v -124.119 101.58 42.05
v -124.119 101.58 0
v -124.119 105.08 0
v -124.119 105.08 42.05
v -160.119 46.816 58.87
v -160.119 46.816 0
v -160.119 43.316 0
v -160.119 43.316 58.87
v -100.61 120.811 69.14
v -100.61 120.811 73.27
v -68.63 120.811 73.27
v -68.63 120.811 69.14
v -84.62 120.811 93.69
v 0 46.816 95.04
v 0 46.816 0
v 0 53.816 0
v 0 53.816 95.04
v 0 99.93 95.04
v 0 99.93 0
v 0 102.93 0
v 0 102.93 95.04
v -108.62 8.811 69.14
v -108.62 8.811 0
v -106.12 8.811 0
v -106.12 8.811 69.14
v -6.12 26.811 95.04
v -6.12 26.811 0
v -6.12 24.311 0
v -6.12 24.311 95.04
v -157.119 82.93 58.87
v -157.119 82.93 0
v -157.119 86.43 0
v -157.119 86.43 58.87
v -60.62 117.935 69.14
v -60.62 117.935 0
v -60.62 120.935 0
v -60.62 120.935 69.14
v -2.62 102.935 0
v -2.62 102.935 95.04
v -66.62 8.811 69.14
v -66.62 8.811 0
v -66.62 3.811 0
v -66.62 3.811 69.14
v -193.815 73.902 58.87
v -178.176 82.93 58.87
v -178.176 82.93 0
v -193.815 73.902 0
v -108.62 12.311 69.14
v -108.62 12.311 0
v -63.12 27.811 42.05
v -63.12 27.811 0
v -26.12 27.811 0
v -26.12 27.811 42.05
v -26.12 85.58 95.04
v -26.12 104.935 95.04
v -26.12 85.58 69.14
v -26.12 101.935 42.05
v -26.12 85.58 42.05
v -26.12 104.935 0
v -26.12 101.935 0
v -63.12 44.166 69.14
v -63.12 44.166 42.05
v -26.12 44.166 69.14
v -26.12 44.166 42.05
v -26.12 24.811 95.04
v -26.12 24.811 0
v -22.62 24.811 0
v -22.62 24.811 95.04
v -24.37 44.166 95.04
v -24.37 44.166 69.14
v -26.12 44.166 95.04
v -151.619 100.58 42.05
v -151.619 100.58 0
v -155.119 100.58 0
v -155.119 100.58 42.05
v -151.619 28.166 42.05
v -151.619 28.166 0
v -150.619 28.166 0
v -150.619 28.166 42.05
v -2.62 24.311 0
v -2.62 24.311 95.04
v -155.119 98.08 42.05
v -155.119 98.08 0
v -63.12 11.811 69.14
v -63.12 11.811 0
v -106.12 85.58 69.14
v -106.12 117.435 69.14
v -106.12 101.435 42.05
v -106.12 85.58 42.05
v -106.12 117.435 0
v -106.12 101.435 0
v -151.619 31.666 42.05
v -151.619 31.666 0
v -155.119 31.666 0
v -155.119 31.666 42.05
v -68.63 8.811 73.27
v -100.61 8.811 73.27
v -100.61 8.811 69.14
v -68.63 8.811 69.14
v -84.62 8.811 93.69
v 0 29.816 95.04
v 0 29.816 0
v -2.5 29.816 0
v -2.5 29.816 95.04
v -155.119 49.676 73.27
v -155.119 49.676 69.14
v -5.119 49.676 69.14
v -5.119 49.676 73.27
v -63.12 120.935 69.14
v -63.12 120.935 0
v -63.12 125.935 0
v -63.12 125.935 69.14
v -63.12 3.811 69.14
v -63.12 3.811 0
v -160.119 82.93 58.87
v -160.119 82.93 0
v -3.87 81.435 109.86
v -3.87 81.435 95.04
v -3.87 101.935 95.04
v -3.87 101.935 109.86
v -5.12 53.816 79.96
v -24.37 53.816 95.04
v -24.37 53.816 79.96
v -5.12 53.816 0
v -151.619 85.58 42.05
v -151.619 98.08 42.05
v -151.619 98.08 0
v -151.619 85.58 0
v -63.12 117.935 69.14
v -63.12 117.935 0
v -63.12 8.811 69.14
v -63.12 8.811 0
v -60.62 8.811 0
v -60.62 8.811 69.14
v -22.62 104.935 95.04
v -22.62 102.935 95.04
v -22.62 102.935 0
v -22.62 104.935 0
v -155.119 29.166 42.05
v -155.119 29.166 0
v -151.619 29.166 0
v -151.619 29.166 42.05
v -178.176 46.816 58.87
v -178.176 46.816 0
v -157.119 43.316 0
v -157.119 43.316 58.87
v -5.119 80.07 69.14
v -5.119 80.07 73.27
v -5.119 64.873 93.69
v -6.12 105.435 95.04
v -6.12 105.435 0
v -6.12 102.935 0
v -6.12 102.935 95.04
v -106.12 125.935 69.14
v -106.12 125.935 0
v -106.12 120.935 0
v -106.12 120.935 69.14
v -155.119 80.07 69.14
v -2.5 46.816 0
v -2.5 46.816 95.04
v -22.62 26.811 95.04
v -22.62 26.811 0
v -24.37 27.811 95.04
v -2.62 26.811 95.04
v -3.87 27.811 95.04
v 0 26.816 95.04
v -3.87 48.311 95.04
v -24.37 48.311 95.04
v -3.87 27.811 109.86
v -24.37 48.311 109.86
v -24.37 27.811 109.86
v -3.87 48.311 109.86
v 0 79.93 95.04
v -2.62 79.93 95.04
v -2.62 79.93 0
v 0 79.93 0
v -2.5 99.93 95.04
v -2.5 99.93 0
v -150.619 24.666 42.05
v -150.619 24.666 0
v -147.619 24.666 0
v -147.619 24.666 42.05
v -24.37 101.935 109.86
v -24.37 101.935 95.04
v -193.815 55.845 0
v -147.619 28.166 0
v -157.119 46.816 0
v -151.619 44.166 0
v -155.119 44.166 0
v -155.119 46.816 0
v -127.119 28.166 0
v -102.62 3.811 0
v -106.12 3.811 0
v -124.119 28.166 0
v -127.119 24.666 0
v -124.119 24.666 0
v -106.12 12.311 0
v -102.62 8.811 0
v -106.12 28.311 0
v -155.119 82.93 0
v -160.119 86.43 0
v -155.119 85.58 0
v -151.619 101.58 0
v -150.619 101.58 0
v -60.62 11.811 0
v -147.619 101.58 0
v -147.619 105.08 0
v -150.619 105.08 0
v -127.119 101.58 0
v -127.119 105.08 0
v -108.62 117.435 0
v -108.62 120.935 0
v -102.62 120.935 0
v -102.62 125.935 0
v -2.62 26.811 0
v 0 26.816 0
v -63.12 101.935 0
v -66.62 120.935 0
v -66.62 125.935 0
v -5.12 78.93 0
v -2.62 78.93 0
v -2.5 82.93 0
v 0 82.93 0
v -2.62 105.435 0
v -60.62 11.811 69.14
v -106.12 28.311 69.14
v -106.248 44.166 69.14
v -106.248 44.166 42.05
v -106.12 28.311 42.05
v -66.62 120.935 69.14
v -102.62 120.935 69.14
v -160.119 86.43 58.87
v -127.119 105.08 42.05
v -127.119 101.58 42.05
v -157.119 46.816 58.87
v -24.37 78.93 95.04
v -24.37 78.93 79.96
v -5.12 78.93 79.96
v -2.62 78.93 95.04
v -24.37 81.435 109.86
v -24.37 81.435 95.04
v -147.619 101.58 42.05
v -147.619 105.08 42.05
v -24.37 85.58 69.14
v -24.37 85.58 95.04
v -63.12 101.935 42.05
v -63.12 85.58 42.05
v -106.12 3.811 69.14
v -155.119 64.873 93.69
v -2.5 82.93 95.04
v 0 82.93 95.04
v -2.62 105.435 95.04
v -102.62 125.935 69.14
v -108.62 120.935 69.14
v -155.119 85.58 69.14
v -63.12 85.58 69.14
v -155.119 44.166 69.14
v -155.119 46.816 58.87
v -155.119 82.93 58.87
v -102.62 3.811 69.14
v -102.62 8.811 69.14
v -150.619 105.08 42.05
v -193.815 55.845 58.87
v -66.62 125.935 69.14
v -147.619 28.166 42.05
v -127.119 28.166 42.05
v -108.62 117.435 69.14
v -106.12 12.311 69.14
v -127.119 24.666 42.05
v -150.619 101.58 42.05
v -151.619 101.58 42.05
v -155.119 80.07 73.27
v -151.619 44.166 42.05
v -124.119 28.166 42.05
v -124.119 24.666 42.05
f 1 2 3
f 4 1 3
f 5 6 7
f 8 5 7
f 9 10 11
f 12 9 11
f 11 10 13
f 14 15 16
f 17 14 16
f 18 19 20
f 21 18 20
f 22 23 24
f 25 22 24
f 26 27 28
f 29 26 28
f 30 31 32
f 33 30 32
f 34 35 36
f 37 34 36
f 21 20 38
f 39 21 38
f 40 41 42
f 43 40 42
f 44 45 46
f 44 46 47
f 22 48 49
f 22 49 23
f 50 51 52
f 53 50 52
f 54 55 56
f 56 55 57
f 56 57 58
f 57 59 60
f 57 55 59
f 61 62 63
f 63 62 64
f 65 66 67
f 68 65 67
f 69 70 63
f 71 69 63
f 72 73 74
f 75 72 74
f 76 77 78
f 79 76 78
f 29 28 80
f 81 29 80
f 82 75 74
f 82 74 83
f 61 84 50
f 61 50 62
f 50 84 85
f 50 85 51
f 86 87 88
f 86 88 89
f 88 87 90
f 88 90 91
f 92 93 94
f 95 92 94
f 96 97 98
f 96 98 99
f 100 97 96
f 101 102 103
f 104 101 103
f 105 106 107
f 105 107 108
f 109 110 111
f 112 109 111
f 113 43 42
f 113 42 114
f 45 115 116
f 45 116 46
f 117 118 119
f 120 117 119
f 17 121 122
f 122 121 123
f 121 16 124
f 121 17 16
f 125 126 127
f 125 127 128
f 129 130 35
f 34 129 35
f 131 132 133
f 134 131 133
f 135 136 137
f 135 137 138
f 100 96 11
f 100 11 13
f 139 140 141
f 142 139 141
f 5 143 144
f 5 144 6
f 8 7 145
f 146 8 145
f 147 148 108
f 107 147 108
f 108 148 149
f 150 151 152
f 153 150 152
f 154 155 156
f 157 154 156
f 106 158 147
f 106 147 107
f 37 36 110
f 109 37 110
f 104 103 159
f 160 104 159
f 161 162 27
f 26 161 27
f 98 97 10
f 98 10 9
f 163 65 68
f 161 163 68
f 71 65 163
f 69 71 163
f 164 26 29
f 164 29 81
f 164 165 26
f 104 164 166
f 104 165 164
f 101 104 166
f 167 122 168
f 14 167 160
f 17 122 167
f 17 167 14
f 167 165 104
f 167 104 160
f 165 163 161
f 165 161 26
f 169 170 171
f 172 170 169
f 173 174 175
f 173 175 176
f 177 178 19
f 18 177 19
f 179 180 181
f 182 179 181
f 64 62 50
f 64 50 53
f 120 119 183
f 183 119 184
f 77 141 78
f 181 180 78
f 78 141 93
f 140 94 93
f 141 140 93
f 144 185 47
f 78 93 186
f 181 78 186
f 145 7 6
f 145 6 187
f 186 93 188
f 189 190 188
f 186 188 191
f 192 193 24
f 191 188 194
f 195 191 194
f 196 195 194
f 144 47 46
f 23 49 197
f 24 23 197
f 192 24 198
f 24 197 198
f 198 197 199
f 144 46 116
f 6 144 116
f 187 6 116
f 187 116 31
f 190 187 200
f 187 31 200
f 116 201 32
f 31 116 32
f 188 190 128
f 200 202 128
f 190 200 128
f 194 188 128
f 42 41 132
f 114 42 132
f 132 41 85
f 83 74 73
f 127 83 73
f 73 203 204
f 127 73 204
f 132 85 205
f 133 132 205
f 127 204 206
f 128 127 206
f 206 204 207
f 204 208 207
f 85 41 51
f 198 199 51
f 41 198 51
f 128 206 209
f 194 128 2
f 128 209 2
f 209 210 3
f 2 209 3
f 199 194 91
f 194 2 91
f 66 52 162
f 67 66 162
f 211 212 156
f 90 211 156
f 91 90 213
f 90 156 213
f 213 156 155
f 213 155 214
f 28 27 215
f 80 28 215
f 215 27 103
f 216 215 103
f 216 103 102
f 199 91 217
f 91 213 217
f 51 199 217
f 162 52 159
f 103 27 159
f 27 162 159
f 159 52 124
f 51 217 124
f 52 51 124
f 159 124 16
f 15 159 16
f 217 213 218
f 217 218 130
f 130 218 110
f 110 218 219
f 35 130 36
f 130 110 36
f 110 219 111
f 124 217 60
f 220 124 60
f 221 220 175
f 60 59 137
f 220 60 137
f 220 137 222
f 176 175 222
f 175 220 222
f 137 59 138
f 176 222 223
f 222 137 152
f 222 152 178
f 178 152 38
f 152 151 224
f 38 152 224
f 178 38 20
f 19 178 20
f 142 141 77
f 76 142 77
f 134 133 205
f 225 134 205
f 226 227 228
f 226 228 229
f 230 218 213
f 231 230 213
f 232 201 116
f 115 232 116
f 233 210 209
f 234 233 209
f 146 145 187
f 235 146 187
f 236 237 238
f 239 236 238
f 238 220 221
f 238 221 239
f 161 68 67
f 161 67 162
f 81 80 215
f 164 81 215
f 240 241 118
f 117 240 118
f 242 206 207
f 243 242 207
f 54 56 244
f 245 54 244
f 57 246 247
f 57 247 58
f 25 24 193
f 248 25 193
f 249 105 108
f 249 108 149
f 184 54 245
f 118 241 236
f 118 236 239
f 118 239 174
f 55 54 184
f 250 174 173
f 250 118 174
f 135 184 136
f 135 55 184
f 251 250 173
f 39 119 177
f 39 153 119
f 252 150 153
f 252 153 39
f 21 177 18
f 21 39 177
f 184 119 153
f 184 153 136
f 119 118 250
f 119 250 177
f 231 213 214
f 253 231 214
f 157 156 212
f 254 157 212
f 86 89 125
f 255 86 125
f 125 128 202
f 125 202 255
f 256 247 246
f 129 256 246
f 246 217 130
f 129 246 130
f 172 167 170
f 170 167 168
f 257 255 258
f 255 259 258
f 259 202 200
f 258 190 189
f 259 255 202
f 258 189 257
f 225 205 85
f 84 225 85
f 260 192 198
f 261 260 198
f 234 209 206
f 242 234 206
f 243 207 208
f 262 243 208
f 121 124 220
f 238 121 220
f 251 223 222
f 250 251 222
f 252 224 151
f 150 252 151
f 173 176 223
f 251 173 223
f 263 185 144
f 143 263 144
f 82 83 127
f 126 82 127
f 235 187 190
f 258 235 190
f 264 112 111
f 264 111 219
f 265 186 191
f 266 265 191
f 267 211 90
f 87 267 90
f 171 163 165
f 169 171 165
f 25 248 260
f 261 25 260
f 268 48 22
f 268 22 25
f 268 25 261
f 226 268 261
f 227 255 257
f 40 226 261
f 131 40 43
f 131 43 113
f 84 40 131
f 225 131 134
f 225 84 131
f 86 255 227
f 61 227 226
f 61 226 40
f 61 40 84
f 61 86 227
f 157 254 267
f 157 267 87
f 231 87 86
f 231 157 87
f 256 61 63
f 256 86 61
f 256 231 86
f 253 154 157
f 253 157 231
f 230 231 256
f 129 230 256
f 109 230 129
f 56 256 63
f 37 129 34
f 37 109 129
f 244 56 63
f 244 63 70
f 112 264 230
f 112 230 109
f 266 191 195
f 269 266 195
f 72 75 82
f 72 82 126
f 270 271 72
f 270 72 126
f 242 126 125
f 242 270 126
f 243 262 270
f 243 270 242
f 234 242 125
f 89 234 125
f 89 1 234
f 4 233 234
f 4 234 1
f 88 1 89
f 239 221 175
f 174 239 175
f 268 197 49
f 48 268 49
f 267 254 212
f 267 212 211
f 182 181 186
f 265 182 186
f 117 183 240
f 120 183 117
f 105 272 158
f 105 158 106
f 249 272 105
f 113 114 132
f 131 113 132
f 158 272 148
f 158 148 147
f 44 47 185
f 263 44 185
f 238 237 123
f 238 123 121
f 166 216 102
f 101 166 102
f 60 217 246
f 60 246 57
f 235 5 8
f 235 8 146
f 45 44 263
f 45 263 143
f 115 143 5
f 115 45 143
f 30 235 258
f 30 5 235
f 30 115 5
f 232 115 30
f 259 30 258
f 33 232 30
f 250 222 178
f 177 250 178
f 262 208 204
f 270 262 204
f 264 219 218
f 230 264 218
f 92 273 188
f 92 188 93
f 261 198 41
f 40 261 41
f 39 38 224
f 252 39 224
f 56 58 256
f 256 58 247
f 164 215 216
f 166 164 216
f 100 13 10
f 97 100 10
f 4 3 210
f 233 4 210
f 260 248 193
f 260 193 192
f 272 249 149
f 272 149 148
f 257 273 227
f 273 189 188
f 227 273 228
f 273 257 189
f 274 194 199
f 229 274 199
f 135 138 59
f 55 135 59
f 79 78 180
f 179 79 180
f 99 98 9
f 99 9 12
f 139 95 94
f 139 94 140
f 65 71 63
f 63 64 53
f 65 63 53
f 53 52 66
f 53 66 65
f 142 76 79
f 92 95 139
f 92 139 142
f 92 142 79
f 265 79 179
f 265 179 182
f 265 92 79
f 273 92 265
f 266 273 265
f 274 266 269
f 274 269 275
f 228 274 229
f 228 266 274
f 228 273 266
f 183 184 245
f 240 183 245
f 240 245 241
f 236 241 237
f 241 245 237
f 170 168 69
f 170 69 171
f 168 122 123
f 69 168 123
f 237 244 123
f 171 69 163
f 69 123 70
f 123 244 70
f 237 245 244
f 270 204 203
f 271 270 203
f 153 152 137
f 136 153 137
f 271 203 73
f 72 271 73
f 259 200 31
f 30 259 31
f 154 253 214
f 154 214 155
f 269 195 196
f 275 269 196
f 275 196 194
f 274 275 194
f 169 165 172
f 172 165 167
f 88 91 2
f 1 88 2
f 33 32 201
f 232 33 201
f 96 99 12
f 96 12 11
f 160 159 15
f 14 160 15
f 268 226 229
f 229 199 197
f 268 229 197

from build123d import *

# Parameters (mm, degrees)
F1_DEPTH  = 58.87
F2_DEPTH  = 69.14
F3_DEPTH  = 109.86
F4_DEPTH  = 95.04
F0_W      = 37
F0_H      = 16.3545590473
F5_DEPTH  = 42.05
F6_DEPTH  = 79.96
F8_DEPTH  = 150
F10_DEPTH = 112


with BuildPart() as f1:
    # F0 (on Top) → F1 (new body)
    with BuildSketch(Plane.XY):
        Polygon((-155.1193287611, 46.8162132949), (-155.1193287611, 82.9299445897), (-157.1193287611, 82.9299445897), (-157.1193287611, 86.4299445897), (-160.1193287611, 86.4299445897), (-160.1193287611, 82.9299445897), (-178.1763287611, 82.9299445897), (-193.8146996498, 73.901511766), (-193.8146996498, 64.8730789423), (-193.8146996498, 55.8446461186), (-178.1763287611, 46.8162132949), (-160.1193287611, 46.8162132949), (-160.1193287611, 43.3162132949), (-157.1193287611, 43.3162132949), (-157.1193287611, 46.8162132949), align=None)
    extrude(amount=F1_DEPTH)

    # F0 (on Top) → F2 (join)
    with BuildSketch(Plane.XY):
        Polygon((-24.369916356, 85.5801147534), (-26.119916356, 85.5801147534), (-63.119916356, 85.5801147534), (-106.119916356, 85.5801147534), (-151.6193287611, 85.5801147534), (-155.1193287611, 85.5801147534), (-155.1193287611, 82.9299445897), (-155.1193287611, 46.8162132949), (-155.1193287611, 44.1660431312), (-151.6193287611, 44.1660431312), (-106.2480262143, 44.1660431312), (-63.119916356, 44.1660431312), (-26.119916356, 44.1660431312), (-24.369916356, 44.1660431312), (-24.369916356, 48.3114840839), (-24.369916356, 53.8162132949), (-24.369916356, 78.9299445897), (-24.369916356, 81.4346738007), align=None)
        Polygon((-63.119916356, 85.5801147534), (-63.119916356, 101.9346738007), (-63.119916356, 117.9346738007), (-60.619916356, 117.9346738007), (-60.619916356, 120.9346738007), (-63.119916356, 120.9346738007), (-63.119916356, 125.9346738007), (-66.619916356, 125.9346738007), (-66.619916356, 120.9346738007), (-102.619916356, 120.9346738007), (-102.619916356, 125.9346738007), (-106.119916356, 125.9346738007), (-106.119916356, 120.9346738007), (-108.619916356, 120.9346738007), (-108.619916356, 117.4346738007), (-106.119916356, 117.4346738007), (-106.119916356, 101.4346738007), (-106.119916356, 85.5801147534), align=None)
        Polygon((-63.119916356, 27.8114840839), (-63.119916356, 44.1660431312), (-106.2480262143, 44.1660431312), (-106.119916356, 28.3114840839), (-106.119916356, 12.3114840839), (-108.619916356, 12.3114840839), (-108.619916356, 8.8114840839), (-106.119916356, 8.8114840839), (-106.119916356, 3.8114840839), (-102.619916356, 3.8114840839), (-102.619916356, 8.8114840839), (-66.619916356, 8.8114840839), (-66.619916356, 3.8114840839), (-63.119916356, 3.8114840839), (-63.119916356, 8.8114840839), (-60.619916356, 8.8114840839), (-60.619916356, 11.8114840839), (-63.119916356, 11.8114840839), align=None)
    extrude(amount=F2_DEPTH)

    # F0 (on Top) → F3 (join)
    with BuildSketch(Plane.XY):
        Polygon((-24.369916356, 101.9346738007), (-24.369916356, 85.5801147534), (-24.369916356, 81.4346738007), (-3.869916356, 81.4346738007), (-3.869916356, 101.9346738007), align=None)
        Polygon((-3.869916356, 48.3114840839), (-24.369916356, 48.3114840839), (-24.369916356, 44.1660431312), (-24.369916356, 27.8114840839), (-3.869916356, 27.8114840839), align=None)
    extrude(amount=F3_DEPTH)

    # F0 (on Top) → F4 (join)
    with BuildSketch(Plane.XY):
        Polygon((-5.119916356, 53.8162132949), (-24.369916356, 53.8162132949), (-24.369916356, 48.3114840839), (-3.869916356, 48.3114840839), (-3.869916356, 27.8114840839), (-24.369916356, 27.8114840839), (-24.369916356, 44.1660431312), (-26.119916356, 44.1660431312), (-26.119916356, 27.8114840839), (-26.119916356, 24.8114840839), (-22.619916356, 24.8114840839), (-22.619916356, 26.8114840839), (-6.119916356, 26.8114840839), (-6.119916356, 24.3114840839), (-2.619916356, 24.3114840839), (-2.619916356, 26.8114840839), (0, 26.8162132949), (0, 29.8162132949), (-2.5, 29.8162132949), (-2.5, 46.8162132949), (0, 46.8162132949), (0, 53.8162132949), align=None)
        Polygon((-2.619916356, 102.9346738007), (-2.619916356, 105.4346738007), (-6.119916356, 105.4346738007), (-6.119916356, 102.9346738007), (-22.619916356, 102.9346738007), (-22.619916356, 104.9346738007), (-26.119916356, 104.9346738007), (-26.119916356, 101.9346738007), (-26.119916356, 85.5801147534), (-24.369916356, 85.5801147534), (-24.369916356, 101.9346738007), (-3.869916356, 101.9346738007), (-3.869916356, 81.4346738007), (-24.369916356, 81.4346738007), (-24.369916356, 78.9299445897), (-5.119916356, 78.9299445897), (-2.619916356, 78.9299445897), (-2.619916356, 79.9299445897), (0, 79.9299445897), (0, 82.9299445897), (-2.5, 82.9299445897), (-2.5, 99.9299445897), (0, 99.9299445897), (0, 102.9299445897), align=None)
    extrude(amount=F4_DEPTH)

    # F0 (on Top) → F5 (join)
    with BuildSketch(Plane.XY):
        with Locations((-44.619916356, 93.7573942771)):
            Rectangle(F0_W, F0_H)
        Polygon((-151.6193287611, 85.5801147534), (-106.119916356, 85.5801147534), (-106.119916356, 101.4346738007), (-124.1193287611, 101.5801147534), (-124.1193287611, 105.0801147534), (-127.1193287611, 105.0801147534), (-127.1193287611, 101.5801147534), (-147.6193287611, 101.5801147534), (-147.6193287611, 105.0801147534), (-150.6193287611, 105.0801147534), (-150.6193287611, 101.5801147534), (-151.6193287611, 101.5801147534), (-151.6193287611, 100.5801147534), (-155.1193287611, 100.5801147534), (-155.1193287611, 98.0801147534), (-151.6193287611, 98.0801147534), align=None)
        with Locations((-44.619916356, 35.9887636075)):
            Rectangle(F0_W, F0_H)
        Polygon((-106.2480262143, 44.1660431312), (-151.6193287611, 44.1660431312), (-151.6193287611, 31.6660431312), (-155.1193287611, 31.6660431312), (-155.1193287611, 29.1660431312), (-151.6193287611, 29.1660431312), (-151.6193287611, 28.1660431312), (-150.6193287611, 28.1660431312), (-150.6193287611, 24.6660431312), (-147.6193287611, 24.6660431312), (-147.6193287611, 28.1660431312), (-127.1193287611, 28.1660431312), (-127.1193287611, 24.6660431312), (-124.1193287611, 24.6660431312), (-124.1193287611, 28.1660431312), (-106.119916356, 28.3114840839), align=None)
    extrude(amount=F5_DEPTH)

    # F0 (on Top) → F6 (join)
    with BuildSketch(Plane.XY):
        Polygon((-5.119916356, 64.8730789423), (-5.119916356, 78.9299445897), (-24.369916356, 78.9299445897), (-24.369916356, 53.8162132949), (-5.119916356, 53.8162132949), align=None)
    extrude(amount=F6_DEPTH)


with BuildPart() as f8:
    # F7 (on face) → F8 (new body)
    with BuildSketch(Plane(origin=(-155.1193287611, 0, 0), x_dir=(0, -1, 0), z_dir=(-1, 0, 0))):
        Polygon((-80.0701147534, 73.27), (-80.0701147534, 69.14), (-49.6760431312, 69.14), (-49.6760431312, 73.27), (-64.8730789423, 93.69), align=None)
    extrude(amount=-F8_DEPTH)


with BuildPart() as f10:
    # F9 (on face) → F10 (new body)
    with BuildSketch(Plane.XZ.offset(-8.8114840839)):
        Polygon((-100.609916356, 73.27), (-100.609916356, 69.14), (-68.629916356, 69.14), (-68.629916356, 73.27), (-84.619916356, 93.69), align=None)
    extrude(amount=-F10_DEPTH)


solid = Compound([f1.part, f8.part, f10.part])
